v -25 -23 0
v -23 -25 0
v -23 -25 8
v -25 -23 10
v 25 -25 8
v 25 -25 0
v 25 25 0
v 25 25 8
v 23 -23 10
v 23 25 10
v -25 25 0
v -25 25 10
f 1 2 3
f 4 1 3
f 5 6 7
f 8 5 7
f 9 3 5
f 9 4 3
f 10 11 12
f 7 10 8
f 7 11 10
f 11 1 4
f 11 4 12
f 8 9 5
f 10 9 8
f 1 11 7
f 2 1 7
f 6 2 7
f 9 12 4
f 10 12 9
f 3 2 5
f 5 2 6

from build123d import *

# Parameters (mm, degrees)
SKETCH_W        = 50
SKETCH_H        = 50
PAD_DEPTH       = 10
CHAMFER_SIZE    = 2
CHAMFER001_SIZE = 2


with BuildPart() as part:
    # Sketch → Pad (new body)
    with BuildSketch(Plane.XY):
        Rectangle(SKETCH_W, SKETCH_H)
    extrude(amount=PAD_DEPTH)

    # Chamfer
    chamfer_edges = [part.edges().sort_by_distance(p)[0] for p in [
        (0, -25, 10),
        (25, 0, 10),
    ]]
    chamfer(chamfer_edges, length=CHAMFER_SIZE)

    # Chamfer001
    chamfer001_edges = [part.edges().sort_by_distance(p)[0] for p in [
        (-25, -25, 4),
    ]]
    chamfer(chamfer001_edges, length=CHAMFER001_SIZE)


solid = part.part
